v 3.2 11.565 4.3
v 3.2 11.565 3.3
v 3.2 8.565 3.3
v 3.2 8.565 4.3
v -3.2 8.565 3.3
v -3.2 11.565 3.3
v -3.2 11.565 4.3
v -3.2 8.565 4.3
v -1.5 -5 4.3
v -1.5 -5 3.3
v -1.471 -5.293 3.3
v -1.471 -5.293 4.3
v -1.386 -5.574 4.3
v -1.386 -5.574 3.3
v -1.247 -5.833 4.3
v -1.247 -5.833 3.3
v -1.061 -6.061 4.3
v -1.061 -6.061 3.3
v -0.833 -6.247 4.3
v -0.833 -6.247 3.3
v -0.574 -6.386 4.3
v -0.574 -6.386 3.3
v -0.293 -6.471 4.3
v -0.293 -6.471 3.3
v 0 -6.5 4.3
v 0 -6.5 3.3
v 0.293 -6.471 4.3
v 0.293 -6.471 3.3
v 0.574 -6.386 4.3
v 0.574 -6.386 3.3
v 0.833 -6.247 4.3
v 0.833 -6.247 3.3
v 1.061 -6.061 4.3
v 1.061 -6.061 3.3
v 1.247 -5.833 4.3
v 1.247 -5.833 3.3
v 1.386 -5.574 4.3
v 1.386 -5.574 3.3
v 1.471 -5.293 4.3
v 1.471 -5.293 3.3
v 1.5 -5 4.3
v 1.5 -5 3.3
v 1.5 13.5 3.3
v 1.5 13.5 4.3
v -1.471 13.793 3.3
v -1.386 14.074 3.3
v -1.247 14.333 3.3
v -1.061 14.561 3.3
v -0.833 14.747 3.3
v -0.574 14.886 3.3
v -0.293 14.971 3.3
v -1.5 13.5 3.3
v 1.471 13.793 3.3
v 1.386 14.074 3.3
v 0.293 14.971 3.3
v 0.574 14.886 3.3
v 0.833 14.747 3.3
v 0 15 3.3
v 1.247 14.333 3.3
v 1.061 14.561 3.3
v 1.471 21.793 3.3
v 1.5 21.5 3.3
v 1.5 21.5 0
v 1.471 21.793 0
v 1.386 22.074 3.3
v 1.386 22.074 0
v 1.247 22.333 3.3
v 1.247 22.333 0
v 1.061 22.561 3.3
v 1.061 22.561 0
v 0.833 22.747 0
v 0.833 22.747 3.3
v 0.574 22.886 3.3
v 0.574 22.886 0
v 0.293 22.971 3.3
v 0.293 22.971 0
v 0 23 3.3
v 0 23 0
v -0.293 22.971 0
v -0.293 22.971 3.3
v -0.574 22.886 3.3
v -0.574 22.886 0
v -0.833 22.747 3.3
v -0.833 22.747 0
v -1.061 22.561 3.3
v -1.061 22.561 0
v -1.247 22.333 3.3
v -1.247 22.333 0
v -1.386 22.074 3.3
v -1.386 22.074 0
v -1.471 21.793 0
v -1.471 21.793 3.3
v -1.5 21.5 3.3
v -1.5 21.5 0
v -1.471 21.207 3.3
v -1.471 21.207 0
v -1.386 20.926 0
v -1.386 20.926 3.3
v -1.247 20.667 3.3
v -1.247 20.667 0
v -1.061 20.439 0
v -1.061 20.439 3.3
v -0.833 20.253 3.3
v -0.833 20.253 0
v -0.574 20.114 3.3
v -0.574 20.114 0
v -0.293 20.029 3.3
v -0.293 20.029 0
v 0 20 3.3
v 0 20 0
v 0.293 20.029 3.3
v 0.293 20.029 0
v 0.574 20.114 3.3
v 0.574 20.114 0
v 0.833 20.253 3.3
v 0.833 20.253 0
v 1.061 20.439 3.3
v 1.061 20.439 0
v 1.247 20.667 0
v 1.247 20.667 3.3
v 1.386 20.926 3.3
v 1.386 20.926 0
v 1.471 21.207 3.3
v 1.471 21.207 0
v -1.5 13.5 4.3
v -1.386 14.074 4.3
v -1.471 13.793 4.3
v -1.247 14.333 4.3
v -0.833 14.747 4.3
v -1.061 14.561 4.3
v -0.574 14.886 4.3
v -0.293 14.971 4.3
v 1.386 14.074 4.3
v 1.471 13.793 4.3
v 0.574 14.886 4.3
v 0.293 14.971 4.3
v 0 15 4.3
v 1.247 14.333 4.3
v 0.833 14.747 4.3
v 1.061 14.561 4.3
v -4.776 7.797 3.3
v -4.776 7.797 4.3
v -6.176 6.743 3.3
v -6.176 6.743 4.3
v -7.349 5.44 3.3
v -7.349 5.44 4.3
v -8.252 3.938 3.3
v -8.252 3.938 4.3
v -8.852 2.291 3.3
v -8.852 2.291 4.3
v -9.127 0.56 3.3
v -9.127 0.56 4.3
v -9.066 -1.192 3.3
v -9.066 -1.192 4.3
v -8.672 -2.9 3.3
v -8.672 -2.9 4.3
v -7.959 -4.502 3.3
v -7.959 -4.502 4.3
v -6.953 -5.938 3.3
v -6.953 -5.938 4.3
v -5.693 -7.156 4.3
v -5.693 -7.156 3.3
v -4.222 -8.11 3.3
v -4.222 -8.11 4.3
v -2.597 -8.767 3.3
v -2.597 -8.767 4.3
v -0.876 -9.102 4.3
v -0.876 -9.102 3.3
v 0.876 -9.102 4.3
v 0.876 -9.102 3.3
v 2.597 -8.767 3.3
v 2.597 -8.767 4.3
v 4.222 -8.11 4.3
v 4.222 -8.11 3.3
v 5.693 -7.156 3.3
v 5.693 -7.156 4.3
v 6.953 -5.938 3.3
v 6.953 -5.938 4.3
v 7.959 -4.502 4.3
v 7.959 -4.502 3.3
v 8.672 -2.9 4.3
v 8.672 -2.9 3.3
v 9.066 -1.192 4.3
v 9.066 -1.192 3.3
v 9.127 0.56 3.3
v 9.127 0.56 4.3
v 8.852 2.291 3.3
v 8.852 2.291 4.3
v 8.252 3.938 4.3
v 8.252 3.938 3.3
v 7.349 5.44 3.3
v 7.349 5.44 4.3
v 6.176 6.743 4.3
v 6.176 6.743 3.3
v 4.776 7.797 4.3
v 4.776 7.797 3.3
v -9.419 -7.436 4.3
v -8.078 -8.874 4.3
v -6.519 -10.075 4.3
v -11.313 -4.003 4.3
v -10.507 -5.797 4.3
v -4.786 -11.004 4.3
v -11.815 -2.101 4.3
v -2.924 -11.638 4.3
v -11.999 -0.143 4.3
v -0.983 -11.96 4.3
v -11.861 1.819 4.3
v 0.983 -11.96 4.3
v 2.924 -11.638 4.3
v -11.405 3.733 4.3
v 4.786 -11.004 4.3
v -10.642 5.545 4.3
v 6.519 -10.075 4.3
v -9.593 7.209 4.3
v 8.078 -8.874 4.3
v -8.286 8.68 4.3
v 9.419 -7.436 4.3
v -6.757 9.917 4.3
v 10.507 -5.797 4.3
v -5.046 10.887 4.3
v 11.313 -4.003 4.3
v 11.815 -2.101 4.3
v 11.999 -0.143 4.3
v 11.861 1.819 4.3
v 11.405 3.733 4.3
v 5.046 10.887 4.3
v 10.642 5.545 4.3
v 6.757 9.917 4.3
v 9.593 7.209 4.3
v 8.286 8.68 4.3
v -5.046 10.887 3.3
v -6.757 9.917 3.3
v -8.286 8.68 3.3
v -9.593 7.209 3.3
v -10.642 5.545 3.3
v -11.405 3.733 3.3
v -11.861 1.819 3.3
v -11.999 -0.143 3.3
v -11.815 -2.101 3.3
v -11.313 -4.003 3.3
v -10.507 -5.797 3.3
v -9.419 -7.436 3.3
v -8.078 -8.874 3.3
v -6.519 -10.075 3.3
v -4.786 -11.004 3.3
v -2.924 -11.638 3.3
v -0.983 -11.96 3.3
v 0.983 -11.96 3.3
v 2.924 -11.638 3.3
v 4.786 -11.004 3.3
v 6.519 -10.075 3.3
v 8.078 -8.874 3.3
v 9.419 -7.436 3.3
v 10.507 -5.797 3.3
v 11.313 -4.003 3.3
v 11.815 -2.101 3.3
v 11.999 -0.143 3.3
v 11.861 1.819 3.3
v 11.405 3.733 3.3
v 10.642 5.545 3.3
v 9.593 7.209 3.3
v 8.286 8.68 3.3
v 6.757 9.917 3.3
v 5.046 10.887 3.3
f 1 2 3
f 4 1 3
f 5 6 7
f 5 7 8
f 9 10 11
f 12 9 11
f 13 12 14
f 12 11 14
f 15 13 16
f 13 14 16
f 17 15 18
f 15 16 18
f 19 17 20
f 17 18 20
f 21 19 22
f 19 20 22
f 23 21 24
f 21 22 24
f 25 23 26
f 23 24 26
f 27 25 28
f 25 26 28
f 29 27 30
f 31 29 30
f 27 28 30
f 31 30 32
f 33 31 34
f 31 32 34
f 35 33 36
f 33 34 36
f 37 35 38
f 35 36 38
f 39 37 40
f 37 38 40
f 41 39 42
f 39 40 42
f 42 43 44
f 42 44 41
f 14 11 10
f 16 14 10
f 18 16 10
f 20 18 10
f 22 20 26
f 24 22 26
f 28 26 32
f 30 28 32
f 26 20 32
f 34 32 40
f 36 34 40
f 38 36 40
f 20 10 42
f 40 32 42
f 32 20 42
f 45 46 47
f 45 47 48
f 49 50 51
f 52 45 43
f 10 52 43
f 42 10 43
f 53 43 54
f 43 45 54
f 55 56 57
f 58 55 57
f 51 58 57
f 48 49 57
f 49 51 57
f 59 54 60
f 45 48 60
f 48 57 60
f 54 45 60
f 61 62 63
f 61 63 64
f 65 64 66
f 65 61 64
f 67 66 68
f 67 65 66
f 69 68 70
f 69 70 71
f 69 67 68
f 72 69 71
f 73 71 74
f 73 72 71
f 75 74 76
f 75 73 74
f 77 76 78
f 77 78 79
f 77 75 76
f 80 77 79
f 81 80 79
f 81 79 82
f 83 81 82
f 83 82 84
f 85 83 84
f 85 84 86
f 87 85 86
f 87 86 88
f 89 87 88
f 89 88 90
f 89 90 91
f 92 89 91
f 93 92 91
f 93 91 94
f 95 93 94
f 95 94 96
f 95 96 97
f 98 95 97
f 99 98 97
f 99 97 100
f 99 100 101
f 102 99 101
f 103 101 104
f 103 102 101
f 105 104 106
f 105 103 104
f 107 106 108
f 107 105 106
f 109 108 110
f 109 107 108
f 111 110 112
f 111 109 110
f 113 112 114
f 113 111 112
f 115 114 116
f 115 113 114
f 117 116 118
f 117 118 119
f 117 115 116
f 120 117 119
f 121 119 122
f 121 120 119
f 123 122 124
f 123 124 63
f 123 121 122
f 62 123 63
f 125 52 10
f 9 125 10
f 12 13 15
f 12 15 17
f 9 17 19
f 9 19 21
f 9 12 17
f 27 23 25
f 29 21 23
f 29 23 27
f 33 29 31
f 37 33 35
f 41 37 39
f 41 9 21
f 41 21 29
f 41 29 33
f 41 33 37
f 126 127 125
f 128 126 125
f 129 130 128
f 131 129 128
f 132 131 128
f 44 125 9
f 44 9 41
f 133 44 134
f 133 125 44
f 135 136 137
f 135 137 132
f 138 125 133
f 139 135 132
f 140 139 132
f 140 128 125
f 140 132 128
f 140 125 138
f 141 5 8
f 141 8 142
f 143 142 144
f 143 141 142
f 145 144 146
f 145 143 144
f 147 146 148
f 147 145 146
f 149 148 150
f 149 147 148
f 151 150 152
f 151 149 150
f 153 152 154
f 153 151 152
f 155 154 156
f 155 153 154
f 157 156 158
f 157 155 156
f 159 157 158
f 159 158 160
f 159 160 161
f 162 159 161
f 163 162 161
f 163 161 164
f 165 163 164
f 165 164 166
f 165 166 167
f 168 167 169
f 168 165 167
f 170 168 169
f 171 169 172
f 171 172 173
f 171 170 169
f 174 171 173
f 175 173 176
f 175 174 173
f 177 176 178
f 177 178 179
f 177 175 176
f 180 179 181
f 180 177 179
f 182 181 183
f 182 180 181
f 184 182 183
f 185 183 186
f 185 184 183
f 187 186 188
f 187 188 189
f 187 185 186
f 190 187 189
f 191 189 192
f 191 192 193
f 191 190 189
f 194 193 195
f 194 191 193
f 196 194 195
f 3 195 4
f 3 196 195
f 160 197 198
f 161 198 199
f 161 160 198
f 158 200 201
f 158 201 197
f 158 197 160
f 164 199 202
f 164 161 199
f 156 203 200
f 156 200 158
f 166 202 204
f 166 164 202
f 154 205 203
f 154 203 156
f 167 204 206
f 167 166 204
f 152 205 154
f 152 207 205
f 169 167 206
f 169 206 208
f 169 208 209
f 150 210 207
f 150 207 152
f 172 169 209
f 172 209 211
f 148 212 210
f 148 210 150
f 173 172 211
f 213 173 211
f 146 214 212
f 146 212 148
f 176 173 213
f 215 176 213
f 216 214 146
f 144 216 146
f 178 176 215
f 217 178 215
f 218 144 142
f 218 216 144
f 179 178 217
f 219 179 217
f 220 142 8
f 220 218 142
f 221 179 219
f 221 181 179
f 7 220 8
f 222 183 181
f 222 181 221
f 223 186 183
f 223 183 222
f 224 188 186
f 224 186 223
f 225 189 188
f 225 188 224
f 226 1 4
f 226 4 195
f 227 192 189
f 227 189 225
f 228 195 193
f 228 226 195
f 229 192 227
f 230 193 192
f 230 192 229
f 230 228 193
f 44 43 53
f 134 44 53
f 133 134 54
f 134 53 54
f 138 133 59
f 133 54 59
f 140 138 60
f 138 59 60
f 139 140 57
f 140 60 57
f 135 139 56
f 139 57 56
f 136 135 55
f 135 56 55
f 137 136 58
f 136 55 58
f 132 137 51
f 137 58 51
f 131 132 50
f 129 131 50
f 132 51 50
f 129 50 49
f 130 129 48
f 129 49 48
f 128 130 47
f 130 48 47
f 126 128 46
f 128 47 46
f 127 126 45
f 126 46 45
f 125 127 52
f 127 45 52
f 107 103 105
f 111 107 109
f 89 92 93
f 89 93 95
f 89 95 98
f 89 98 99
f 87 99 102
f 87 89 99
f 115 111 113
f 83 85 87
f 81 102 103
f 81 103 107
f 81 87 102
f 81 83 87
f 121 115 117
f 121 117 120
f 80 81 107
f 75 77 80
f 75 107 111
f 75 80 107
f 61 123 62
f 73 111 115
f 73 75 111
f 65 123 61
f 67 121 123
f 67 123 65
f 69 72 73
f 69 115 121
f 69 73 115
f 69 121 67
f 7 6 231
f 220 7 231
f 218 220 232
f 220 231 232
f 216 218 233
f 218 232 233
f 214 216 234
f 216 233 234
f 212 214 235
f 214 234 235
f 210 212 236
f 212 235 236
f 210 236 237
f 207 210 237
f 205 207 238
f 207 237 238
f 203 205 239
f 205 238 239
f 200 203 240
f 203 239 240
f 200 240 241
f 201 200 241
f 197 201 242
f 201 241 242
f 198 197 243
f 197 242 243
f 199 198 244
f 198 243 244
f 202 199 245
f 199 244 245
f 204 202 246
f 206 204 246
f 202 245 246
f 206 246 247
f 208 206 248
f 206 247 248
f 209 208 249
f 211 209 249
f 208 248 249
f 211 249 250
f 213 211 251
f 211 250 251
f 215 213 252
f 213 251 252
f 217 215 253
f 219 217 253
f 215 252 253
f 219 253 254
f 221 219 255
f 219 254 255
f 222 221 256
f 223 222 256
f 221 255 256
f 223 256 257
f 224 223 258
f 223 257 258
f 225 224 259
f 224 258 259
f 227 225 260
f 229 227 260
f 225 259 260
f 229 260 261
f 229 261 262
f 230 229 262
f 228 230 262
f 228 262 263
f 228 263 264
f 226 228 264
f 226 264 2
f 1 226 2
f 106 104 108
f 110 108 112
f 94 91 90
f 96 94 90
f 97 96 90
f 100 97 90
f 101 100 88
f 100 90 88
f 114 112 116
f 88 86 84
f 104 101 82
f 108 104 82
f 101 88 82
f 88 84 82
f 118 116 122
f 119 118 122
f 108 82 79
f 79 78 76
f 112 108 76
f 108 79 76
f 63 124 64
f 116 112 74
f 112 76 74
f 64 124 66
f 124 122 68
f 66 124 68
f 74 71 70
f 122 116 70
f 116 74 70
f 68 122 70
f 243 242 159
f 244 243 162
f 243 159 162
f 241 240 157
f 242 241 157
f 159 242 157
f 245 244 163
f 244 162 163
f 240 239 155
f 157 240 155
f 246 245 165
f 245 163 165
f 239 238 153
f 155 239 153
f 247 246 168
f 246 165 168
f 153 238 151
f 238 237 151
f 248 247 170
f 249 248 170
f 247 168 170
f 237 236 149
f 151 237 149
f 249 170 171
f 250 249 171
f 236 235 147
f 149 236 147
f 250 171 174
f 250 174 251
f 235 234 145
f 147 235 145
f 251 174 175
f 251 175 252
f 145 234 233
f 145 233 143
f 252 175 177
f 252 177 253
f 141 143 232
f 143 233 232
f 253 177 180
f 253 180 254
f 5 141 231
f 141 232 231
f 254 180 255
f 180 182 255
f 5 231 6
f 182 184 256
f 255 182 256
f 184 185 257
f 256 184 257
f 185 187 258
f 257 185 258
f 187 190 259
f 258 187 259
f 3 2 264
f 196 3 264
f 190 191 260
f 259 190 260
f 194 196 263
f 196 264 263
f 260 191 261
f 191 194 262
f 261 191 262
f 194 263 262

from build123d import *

# Parameters (mm, degrees)
EXTRUDE_DEPTH   = 3.3
SKETCH003_R     = 1.5
POCKET001_DEPTH = 3.301
PAD_DEPTH       = 1


with BuildPart() as casino_chip:
    # Sketch → Extrude (new body)
    with BuildSketch(Plane.XY):
        with BuildLine():
            ThreePointArc((3.5, 21.5), (0, 25), (-3.5, 21.5))
            Line((-3.5, 21.5), (-3.5, 19.691369))
            ThreePointArc((-3.5, 19.691369), (0, -20), (3.5, 19.691369))
            Line((3.5, 19.691369), (3.5, 21.5))
        make_face()
    extrude(amount=EXTRUDE_DEPTH)


with BuildPart() as pocket001:
    # Pocket001 base: copy of casino-chip
    add(casino_chip.part)

    # Sketch003 → Pocket001 (cut, through all)
    with BuildSketch(Plane.XY.offset(3.3)):
        with Locations((0, 21.5)):
            Circle(SKETCH003_R)
    extrude(amount=-POCKET001_DEPTH, mode=Mode.SUBTRACT)


with BuildPart() as cut001:
    # Pad base: copy of casino-chip
    add(casino_chip.part)

    # Sketch002 → Pad (new body)
    with BuildSketch(Plane.XY.offset(3.3)):
        with BuildLine():
            ThreePointArc((1.5, 13.5), (0, 15), (-1.5, 13.5))
            Line((-1.5, 13.5), (-1.5, -5))
            ThreePointArc((-1.5, -5), (0, -6.5), (1.5, -5))
            Line((1.5, 13.5), (1.5, -5))
        make_face()
        with BuildLine():
            ThreePointArc((-3.2, 11.565466), (0, -12), (3.2, 11.565466))
            Line((3.2, 11.565466), (3.2, 8.565466))
            ThreePointArc((-3.2, 8.565466), (0, -9.143698), (3.2, 8.565466))
            Line((-3.2, 11.565466), (-3.2, 8.565466))
        make_face()
    extrude(amount=PAD_DEPTH)

    # Cut001: cut Pocket001
    add(pocket001.part, mode=Mode.SUBTRACT)


solid = cut001.part
